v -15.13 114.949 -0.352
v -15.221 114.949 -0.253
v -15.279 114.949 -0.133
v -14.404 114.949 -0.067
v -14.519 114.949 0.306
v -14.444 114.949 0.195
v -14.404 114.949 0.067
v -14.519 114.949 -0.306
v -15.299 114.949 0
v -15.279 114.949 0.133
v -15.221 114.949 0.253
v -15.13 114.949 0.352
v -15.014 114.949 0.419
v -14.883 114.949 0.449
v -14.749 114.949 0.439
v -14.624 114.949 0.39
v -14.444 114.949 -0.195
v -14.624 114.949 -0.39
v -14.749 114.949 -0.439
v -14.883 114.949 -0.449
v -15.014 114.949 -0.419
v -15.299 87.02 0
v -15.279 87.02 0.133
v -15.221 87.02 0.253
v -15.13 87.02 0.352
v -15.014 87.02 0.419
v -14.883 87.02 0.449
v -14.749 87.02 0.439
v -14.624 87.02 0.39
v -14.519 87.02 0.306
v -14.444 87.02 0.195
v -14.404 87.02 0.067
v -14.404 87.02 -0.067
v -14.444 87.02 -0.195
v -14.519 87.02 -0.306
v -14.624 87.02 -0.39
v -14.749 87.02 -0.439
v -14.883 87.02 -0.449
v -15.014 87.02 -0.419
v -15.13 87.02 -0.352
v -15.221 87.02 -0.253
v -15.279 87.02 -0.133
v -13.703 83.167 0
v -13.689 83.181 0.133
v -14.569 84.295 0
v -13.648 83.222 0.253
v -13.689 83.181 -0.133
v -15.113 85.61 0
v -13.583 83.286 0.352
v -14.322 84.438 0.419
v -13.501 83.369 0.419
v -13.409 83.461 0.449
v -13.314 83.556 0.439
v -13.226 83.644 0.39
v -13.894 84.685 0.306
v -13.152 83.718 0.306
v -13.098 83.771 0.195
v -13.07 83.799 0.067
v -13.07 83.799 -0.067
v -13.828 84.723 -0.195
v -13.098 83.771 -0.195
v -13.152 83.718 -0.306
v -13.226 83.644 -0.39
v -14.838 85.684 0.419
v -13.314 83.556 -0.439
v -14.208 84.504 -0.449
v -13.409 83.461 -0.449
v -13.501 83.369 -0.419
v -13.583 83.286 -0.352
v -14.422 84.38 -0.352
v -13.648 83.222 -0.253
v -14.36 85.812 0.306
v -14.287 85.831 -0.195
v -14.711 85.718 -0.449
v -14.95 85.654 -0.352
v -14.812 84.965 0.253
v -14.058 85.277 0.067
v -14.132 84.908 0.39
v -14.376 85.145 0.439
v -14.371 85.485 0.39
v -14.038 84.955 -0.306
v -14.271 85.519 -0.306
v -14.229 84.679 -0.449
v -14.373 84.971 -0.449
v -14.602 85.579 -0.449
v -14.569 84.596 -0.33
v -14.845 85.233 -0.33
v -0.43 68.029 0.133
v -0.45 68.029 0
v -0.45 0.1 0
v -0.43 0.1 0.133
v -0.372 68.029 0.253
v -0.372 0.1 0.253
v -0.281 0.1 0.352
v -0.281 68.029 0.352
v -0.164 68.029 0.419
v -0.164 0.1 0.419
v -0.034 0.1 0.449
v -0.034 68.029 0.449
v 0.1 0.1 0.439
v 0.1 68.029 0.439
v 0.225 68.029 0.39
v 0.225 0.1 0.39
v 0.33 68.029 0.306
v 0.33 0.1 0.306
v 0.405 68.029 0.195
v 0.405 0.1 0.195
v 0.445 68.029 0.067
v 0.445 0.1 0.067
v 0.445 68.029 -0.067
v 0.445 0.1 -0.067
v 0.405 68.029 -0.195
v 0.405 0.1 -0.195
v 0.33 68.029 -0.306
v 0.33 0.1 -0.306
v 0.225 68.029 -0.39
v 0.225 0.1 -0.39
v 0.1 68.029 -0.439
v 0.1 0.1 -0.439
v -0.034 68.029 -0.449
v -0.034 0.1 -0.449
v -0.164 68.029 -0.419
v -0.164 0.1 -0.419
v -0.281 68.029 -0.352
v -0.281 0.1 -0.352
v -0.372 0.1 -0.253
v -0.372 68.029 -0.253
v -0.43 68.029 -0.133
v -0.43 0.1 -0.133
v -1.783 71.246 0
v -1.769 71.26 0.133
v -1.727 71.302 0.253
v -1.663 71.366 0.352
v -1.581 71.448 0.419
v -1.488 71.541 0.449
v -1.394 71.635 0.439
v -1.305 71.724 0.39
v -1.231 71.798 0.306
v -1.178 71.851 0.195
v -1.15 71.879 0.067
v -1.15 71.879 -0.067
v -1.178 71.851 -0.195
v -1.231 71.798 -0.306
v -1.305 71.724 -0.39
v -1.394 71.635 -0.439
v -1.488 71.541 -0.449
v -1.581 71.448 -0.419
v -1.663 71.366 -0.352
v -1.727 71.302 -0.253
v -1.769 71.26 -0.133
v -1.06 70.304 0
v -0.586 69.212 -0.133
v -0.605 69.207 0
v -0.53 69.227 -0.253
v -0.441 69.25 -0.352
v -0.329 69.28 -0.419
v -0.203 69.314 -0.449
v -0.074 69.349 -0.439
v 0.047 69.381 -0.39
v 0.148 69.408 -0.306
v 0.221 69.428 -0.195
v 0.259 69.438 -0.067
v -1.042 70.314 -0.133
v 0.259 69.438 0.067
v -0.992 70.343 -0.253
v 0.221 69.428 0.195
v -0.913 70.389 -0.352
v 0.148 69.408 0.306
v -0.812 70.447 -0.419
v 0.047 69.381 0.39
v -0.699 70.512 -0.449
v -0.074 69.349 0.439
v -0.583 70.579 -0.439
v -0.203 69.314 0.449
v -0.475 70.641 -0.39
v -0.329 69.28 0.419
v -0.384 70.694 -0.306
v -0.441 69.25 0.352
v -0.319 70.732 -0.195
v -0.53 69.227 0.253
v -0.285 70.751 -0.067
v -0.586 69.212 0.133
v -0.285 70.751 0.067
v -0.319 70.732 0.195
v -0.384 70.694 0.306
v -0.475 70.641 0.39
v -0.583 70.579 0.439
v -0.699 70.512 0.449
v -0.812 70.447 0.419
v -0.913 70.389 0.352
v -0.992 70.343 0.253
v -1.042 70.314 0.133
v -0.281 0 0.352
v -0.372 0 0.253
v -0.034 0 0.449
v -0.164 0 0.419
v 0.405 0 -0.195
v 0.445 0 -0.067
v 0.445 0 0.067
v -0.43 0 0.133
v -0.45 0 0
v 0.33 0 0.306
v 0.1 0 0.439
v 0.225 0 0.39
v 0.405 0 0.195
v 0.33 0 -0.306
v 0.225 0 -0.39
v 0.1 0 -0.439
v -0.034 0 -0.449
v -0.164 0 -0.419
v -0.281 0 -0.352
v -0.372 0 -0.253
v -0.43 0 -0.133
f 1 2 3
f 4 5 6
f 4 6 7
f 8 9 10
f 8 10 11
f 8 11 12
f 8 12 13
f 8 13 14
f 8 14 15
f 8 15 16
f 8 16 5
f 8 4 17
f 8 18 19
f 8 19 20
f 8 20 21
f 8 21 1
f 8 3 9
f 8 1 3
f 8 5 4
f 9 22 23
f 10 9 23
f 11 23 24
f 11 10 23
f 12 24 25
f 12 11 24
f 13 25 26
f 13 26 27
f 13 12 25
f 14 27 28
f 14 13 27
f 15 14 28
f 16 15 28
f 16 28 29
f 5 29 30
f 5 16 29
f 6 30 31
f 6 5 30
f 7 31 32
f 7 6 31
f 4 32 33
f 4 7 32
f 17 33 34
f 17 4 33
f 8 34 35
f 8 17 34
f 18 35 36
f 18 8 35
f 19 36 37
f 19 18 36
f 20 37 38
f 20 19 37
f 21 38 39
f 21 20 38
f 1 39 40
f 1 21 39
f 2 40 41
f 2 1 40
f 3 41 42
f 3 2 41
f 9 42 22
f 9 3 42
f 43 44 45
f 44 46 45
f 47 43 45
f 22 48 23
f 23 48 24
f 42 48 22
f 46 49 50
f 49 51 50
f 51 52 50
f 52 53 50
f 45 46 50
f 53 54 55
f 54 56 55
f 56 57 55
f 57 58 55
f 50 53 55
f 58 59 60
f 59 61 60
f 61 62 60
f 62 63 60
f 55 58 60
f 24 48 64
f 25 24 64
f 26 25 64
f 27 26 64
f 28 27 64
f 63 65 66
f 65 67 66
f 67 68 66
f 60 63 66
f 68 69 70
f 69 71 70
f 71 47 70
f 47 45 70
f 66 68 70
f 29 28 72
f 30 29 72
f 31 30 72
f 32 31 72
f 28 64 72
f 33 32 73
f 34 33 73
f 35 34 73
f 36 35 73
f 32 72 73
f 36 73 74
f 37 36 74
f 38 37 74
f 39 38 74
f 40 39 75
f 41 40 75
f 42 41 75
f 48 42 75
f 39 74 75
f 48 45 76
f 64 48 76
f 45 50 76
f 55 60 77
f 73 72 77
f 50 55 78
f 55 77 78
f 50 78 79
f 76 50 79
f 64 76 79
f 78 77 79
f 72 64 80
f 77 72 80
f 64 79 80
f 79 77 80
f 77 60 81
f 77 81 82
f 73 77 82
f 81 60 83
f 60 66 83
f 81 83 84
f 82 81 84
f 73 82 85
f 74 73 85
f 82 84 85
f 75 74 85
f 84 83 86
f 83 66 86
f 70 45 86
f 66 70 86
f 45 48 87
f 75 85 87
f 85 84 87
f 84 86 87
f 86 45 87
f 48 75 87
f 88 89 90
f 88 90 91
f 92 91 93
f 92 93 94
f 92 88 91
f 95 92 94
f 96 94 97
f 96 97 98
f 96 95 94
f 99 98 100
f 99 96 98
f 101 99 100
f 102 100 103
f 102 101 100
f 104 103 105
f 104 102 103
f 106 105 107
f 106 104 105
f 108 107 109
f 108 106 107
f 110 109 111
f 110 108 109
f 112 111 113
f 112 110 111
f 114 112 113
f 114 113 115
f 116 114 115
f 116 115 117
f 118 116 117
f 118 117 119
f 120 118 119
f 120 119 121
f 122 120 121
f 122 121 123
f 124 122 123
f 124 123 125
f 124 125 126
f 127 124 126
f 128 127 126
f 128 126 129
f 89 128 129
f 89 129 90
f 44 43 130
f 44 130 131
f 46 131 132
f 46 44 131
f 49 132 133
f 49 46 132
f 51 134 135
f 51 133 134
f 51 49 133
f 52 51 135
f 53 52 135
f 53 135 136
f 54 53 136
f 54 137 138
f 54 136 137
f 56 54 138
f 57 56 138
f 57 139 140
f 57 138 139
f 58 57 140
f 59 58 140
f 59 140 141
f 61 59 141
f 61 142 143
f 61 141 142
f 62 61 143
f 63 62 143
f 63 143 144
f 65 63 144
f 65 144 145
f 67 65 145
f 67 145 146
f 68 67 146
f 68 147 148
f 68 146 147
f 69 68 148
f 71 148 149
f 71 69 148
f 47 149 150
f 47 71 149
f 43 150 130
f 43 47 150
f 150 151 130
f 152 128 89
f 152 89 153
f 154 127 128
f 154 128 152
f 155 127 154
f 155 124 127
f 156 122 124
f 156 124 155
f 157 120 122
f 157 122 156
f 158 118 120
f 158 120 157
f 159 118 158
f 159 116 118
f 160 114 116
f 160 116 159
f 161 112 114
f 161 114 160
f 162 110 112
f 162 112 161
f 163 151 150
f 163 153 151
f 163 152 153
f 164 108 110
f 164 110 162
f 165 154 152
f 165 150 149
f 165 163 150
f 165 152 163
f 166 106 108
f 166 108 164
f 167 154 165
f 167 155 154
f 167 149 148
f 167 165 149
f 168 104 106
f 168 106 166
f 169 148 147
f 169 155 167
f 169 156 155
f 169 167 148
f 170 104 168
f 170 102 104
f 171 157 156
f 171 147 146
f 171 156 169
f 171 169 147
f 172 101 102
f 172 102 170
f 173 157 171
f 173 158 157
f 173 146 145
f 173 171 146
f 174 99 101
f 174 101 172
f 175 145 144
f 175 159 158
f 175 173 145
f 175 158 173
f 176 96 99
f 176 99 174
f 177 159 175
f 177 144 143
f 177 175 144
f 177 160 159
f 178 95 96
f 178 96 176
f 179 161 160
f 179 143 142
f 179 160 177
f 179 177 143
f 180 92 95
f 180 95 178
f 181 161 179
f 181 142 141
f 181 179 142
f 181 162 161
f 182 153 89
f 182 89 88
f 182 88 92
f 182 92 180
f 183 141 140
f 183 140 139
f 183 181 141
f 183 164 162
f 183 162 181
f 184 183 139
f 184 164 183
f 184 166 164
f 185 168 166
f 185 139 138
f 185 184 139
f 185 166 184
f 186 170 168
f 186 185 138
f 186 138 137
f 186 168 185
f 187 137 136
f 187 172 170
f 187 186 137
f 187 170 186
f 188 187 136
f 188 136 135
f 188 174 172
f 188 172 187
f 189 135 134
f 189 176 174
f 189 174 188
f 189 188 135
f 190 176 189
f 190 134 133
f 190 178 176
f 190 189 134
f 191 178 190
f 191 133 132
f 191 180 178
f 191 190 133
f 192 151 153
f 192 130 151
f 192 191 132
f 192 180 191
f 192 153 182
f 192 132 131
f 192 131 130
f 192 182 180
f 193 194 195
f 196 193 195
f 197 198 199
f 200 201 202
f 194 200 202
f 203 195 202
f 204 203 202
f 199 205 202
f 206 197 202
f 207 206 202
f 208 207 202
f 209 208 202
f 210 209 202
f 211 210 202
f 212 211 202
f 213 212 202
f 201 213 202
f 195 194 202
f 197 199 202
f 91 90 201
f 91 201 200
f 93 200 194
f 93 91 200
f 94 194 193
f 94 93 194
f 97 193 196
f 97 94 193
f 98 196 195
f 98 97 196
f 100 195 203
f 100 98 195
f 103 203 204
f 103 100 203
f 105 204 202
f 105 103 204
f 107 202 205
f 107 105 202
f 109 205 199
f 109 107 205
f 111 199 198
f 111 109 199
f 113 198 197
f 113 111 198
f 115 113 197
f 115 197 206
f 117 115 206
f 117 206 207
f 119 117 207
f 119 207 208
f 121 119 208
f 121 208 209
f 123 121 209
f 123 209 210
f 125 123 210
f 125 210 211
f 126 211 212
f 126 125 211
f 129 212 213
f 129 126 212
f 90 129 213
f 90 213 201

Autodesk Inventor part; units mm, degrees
ref_plane "YZ Plane" through (0, 0, 0) normal (1, 0, 0) x (0, 1, 0)
ref_plane "XZ Plane" through (0, 0, 0) normal (0, 1, 0) x (-1, 0, 0)
ref_plane "XY Plane" through (0, 0, 0) normal (0, 0, 1) x (1, 0, 0)
sketch "Sketch1" plane through (0, 0, 0) normal (0, 1, 0) x (-1, 0, 0)
  circle A0 centre (0, 0) radius 0.45
  dimension "d0" = 0.9
sketch "Sketch2" plane through (0, 0, 0) normal (0, 0, 1) x (1, 0, 0)
  line L0 (0, 0) -> (0, 0.1)
  line L1 (0, 0.1) -> (0, 68.0289)
  line L2 (0, 70.1) -> (-27.343, 70.1) construction
  line L3 (-1.4645, 71.5645) -> (-13.3848, 83.4848)
  line L4 (-14.8492, 87.0203) -> (-14.8492, 114.9492)
  arc A0 (-14.8492, 87.0203) -> (-13.3848, 83.4848) centre (-9.8492, 87.0203) ccw
  arc A1 (0, 68.0289) -> (-1.4645, 71.5645) centre (-5, 68.0289) ccw
  point P0 (-14.8492, 84.9492)
  dimension "d1" = 0.1
  dimension "d4" = 70
  dimension "d5" = 45
  dimension "d6" = 21
  dimension "d7" = 30
  dimension "d8" = 5
  dimension "d9" = 5
sweep "Sweep2" add profiles "Sketch1" path "Sketch2"
properties part number "cable indice"
